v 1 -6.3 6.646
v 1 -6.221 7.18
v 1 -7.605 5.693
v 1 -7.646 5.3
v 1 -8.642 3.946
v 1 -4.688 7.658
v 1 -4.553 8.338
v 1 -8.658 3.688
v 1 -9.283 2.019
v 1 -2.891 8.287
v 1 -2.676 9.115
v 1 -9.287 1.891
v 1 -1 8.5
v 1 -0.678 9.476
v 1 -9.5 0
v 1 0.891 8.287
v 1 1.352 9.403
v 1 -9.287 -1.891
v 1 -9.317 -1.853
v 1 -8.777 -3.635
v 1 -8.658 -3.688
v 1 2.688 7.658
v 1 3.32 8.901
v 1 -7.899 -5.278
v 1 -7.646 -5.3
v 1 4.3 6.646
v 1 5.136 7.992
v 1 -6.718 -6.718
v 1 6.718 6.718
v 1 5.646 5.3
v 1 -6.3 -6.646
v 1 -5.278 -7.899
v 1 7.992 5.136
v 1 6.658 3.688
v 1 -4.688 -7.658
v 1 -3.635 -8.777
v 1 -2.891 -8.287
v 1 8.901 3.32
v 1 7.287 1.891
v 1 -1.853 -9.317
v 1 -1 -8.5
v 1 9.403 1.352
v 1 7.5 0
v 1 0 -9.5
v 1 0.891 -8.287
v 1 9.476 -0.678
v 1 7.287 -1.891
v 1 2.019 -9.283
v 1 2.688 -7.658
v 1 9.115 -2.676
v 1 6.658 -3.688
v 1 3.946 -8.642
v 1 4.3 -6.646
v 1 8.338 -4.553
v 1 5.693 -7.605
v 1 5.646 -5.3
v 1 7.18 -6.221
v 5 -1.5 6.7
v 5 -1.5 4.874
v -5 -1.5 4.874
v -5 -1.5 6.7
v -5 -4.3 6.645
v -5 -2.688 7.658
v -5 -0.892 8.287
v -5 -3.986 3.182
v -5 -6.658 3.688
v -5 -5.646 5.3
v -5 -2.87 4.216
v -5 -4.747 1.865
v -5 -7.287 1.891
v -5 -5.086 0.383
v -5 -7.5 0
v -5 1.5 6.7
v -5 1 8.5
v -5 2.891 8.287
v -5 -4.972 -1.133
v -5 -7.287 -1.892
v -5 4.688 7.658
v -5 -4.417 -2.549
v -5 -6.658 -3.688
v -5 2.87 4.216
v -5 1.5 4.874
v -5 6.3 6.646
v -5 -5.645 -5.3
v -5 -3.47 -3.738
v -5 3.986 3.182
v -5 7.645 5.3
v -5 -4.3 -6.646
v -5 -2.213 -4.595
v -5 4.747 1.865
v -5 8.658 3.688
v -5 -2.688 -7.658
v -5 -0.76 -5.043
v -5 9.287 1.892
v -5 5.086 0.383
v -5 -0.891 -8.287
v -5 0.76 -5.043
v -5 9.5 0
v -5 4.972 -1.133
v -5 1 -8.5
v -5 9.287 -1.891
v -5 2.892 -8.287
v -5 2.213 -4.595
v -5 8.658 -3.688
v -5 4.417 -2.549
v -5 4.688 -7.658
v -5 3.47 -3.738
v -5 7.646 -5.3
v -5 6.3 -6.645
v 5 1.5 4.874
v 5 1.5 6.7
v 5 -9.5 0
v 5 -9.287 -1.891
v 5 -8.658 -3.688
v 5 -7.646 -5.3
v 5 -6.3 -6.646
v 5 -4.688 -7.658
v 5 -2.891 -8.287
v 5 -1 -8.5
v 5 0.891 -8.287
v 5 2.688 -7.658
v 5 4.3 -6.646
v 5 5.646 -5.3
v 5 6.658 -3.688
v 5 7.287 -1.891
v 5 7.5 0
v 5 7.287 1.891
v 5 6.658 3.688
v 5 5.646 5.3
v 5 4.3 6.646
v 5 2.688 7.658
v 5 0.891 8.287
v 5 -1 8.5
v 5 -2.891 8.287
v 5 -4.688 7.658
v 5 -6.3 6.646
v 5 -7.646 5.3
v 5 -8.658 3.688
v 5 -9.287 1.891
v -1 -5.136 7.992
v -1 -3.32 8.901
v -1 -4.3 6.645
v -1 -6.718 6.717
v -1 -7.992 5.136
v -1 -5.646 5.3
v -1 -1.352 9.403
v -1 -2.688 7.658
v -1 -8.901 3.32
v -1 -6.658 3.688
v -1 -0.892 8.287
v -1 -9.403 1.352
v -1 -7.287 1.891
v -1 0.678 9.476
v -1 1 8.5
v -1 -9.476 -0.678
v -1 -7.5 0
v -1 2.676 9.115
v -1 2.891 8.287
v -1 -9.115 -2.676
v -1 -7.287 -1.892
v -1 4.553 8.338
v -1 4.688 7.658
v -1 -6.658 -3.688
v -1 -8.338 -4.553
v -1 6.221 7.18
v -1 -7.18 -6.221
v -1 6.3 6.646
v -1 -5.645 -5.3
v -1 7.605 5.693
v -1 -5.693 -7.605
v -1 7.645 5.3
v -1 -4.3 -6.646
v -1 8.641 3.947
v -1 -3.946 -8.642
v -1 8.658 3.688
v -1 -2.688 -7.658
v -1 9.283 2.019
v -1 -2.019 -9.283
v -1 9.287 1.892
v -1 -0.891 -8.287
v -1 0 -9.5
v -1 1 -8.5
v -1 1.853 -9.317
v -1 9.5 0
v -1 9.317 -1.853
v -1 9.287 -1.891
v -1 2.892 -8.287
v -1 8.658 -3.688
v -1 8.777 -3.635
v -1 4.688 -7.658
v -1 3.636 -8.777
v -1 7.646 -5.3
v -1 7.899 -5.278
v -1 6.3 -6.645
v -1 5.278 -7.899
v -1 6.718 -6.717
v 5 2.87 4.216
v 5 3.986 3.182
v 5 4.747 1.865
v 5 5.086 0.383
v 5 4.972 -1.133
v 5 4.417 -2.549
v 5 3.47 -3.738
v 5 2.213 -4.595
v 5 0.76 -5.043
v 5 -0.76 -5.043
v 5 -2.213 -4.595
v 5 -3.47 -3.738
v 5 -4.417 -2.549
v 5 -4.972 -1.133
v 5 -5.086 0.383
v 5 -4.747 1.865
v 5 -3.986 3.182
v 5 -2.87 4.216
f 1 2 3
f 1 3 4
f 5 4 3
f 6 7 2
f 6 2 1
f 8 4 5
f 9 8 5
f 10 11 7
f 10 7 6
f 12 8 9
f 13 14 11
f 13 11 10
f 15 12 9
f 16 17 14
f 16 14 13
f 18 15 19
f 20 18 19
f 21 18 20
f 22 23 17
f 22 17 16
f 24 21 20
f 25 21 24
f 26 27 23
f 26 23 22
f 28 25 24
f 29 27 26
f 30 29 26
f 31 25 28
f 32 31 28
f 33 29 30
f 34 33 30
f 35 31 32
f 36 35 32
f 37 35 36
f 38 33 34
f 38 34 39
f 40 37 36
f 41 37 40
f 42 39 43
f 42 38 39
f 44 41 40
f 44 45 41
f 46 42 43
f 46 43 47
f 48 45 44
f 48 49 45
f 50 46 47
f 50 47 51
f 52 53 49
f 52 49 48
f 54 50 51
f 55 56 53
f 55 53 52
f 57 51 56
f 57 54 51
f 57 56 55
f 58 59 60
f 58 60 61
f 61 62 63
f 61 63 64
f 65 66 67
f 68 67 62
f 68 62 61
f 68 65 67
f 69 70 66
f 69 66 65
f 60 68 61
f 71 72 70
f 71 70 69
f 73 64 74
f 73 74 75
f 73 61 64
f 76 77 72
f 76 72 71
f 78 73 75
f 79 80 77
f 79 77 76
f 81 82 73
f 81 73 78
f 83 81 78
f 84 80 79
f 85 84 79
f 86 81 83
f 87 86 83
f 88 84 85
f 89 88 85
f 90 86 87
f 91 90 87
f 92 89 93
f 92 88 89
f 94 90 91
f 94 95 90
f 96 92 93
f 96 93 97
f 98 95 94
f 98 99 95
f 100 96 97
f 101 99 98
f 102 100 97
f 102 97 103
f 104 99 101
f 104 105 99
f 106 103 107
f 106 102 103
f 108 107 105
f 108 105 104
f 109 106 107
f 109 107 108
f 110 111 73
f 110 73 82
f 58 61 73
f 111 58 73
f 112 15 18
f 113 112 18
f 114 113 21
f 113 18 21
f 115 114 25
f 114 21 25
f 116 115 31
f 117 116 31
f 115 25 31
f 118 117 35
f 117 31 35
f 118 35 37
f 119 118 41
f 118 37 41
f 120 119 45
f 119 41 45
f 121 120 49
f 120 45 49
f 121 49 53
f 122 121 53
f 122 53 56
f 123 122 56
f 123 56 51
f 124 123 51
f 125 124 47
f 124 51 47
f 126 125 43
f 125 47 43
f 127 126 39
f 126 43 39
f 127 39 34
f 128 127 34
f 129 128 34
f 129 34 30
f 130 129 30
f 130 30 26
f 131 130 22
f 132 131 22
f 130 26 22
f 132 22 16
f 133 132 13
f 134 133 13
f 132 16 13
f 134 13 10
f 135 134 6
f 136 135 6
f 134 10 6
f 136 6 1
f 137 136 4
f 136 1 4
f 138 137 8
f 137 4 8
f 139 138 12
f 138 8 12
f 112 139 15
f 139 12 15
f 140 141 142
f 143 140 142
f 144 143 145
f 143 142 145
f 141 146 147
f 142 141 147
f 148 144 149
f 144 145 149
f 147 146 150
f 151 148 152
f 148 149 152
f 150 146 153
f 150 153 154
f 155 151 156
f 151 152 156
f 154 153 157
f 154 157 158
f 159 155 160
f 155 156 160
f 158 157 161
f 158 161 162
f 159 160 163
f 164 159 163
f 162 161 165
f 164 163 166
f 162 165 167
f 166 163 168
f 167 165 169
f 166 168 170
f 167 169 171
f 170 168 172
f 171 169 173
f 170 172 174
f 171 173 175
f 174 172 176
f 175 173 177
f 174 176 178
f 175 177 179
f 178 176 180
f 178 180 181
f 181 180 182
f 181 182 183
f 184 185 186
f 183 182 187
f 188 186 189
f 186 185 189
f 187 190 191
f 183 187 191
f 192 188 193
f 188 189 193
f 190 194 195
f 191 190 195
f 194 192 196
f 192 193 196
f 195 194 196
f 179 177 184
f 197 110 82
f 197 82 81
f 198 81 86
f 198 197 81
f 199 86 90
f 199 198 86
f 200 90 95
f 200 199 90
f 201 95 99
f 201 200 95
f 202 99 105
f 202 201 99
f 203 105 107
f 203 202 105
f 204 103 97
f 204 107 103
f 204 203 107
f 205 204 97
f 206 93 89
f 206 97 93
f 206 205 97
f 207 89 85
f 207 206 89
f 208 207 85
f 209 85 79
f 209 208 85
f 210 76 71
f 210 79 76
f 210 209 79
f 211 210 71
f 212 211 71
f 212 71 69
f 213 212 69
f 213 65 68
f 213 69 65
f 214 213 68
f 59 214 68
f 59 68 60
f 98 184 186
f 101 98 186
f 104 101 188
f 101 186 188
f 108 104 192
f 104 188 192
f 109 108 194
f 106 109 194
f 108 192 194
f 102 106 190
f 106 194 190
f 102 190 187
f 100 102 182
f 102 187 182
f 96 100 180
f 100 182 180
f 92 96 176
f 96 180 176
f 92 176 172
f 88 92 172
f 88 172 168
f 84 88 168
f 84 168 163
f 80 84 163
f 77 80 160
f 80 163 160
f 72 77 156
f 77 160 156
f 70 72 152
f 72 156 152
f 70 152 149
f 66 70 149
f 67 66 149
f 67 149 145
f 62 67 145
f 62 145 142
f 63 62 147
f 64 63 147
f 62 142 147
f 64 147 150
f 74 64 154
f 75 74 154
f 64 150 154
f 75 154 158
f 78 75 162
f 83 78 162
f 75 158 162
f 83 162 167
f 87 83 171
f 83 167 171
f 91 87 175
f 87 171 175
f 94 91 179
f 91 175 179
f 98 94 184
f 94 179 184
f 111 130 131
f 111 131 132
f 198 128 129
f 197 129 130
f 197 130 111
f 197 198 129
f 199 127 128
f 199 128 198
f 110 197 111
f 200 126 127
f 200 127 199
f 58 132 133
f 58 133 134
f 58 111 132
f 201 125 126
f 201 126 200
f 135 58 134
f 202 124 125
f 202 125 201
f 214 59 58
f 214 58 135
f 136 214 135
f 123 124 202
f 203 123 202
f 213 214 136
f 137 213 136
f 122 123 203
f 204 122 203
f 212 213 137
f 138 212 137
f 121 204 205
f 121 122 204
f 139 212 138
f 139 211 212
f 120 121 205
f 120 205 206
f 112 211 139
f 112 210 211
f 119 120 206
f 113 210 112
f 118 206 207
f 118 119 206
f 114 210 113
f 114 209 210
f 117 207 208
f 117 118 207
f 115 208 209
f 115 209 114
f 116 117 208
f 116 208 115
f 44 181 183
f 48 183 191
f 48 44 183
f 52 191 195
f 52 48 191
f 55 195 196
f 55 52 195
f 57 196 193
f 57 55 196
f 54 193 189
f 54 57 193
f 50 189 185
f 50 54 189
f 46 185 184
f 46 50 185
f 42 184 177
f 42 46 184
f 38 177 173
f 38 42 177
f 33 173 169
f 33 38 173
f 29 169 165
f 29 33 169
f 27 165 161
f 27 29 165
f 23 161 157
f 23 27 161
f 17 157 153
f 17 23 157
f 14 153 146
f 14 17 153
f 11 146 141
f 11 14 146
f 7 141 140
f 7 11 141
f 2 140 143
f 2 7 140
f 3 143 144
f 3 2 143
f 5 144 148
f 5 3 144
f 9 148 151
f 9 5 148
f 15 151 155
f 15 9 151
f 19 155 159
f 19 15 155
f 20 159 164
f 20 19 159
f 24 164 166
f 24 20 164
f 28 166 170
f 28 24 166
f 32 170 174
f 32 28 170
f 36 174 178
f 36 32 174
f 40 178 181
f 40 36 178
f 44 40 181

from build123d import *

# Parameters (mm, degrees)
SKETCH1_R           = 9.5
BOSS_EXTRUDE1_DEPTH = 1
SKETCH2_R           = 8.5
BOSS_EXTRUDE3_DEPTH = 4
SKETCH3_R           = 8.5
BOSS_EXTRUDE4_DEPTH = 4
CUT_EXTRUDE1_DEPTH  = 17.748134224


with BuildPart() as part:
    # Sketch1 → Boss-Extrude1 (new, symmetric)
    with BuildSketch(Plane.YZ):
        with Locations(Location((0, 0, 0), (0, 0, 270))):
            Circle(SKETCH1_R)
    extrude(amount=BOSS_EXTRUDE1_DEPTH, both=True)

    # Sketch2 → Boss-Extrude3 (add)
    with BuildSketch(Plane.YZ.offset(1)):
        with Locations(Location((-1, 0, 0), (0, 0, 180))):
            Circle(SKETCH2_R)
    extrude(amount=BOSS_EXTRUDE3_DEPTH)

    # Sketch3 → Boss-Extrude4 (add)
    with BuildSketch(Plane(origin=(-1, 0, 0), x_dir=(0, -1, 0), z_dir=(-1, 0, 0))):
        with Locations(Location((-1, 0, 0), (0, 0, 179.999143376))):
            Circle(SKETCH3_R)
    extrude(amount=BOSS_EXTRUDE4_DEPTH)

    # Sketch4 → Cut-Extrude1 (cut, through all)
    with BuildSketch(Plane.YZ.offset(5)):
        with BuildLine():
            Line((-1.5, 4.874423043), (-1.5, 6.7))
            Line((-1.5, 6.7), (1.5, 6.7))
            Line((1.5, 6.7), (1.5, 4.874423043))
            ThreePointArc((1.5, 4.874423043), (0, -5.1), (-1.5, 4.874423043))
        make_face()
    extrude(amount=-CUT_EXTRUDE1_DEPTH, mode=Mode.SUBTRACT)


solid = part.part
